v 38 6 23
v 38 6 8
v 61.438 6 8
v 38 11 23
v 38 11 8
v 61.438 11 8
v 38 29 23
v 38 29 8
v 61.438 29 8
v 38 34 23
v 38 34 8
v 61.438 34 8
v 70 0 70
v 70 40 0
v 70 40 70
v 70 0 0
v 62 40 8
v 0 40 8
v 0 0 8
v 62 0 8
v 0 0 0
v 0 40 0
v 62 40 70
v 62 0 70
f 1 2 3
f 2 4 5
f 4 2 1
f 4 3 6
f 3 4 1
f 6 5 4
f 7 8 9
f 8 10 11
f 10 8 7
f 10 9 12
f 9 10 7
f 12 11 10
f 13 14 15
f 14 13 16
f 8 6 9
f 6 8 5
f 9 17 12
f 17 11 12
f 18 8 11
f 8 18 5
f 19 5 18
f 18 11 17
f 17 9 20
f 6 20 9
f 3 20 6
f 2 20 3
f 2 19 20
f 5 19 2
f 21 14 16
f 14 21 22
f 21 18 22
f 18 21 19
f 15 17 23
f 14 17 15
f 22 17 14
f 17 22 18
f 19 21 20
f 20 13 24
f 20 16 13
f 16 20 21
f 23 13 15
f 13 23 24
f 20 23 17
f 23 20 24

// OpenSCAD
$fn = 32;

// ----------------------------------------------------------------------
// Rib bracket: 2-gusset L bracket
// ----------------------------------------------------------------------

// --- parameters (mm) ---
base_l = 70;              // foot length, X
base_w = 40;              // foot width, Y
base_t = 8;               // foot thickness
plate_t = 8;              // upright plate thickness
plate_h = 70;             // overall height
gus_l = 24;               // gusset leg along the foot
gus_h = 16;               // gusset height
gus_t = 5;                // gusset thickness
gus_edge = 6;             // gusset margin from the foot edge
n_gus = 2;                // gusset count

gus_pitch = (base_w - 2 * gus_edge - gus_t) / (n_gus - 1);  // gusset pitch

union() {
  cube([base_l, base_w, base_t]);
  translate([base_l - plate_t, 0, base_t - 1])
    cube([plate_t, base_w, plate_h - base_t + 1]);
  for (i = [0 : n_gus - 1])
    translate([base_l - plate_t - gus_l, gus_edge + i * gus_pitch, base_t - 1])
      rotate([-90, 0, 0])
        linear_extrude(height = gus_t)
          polygon(points = [[0, 0], [gus_l + 1, 0], [0, -gus_h]]);
}
